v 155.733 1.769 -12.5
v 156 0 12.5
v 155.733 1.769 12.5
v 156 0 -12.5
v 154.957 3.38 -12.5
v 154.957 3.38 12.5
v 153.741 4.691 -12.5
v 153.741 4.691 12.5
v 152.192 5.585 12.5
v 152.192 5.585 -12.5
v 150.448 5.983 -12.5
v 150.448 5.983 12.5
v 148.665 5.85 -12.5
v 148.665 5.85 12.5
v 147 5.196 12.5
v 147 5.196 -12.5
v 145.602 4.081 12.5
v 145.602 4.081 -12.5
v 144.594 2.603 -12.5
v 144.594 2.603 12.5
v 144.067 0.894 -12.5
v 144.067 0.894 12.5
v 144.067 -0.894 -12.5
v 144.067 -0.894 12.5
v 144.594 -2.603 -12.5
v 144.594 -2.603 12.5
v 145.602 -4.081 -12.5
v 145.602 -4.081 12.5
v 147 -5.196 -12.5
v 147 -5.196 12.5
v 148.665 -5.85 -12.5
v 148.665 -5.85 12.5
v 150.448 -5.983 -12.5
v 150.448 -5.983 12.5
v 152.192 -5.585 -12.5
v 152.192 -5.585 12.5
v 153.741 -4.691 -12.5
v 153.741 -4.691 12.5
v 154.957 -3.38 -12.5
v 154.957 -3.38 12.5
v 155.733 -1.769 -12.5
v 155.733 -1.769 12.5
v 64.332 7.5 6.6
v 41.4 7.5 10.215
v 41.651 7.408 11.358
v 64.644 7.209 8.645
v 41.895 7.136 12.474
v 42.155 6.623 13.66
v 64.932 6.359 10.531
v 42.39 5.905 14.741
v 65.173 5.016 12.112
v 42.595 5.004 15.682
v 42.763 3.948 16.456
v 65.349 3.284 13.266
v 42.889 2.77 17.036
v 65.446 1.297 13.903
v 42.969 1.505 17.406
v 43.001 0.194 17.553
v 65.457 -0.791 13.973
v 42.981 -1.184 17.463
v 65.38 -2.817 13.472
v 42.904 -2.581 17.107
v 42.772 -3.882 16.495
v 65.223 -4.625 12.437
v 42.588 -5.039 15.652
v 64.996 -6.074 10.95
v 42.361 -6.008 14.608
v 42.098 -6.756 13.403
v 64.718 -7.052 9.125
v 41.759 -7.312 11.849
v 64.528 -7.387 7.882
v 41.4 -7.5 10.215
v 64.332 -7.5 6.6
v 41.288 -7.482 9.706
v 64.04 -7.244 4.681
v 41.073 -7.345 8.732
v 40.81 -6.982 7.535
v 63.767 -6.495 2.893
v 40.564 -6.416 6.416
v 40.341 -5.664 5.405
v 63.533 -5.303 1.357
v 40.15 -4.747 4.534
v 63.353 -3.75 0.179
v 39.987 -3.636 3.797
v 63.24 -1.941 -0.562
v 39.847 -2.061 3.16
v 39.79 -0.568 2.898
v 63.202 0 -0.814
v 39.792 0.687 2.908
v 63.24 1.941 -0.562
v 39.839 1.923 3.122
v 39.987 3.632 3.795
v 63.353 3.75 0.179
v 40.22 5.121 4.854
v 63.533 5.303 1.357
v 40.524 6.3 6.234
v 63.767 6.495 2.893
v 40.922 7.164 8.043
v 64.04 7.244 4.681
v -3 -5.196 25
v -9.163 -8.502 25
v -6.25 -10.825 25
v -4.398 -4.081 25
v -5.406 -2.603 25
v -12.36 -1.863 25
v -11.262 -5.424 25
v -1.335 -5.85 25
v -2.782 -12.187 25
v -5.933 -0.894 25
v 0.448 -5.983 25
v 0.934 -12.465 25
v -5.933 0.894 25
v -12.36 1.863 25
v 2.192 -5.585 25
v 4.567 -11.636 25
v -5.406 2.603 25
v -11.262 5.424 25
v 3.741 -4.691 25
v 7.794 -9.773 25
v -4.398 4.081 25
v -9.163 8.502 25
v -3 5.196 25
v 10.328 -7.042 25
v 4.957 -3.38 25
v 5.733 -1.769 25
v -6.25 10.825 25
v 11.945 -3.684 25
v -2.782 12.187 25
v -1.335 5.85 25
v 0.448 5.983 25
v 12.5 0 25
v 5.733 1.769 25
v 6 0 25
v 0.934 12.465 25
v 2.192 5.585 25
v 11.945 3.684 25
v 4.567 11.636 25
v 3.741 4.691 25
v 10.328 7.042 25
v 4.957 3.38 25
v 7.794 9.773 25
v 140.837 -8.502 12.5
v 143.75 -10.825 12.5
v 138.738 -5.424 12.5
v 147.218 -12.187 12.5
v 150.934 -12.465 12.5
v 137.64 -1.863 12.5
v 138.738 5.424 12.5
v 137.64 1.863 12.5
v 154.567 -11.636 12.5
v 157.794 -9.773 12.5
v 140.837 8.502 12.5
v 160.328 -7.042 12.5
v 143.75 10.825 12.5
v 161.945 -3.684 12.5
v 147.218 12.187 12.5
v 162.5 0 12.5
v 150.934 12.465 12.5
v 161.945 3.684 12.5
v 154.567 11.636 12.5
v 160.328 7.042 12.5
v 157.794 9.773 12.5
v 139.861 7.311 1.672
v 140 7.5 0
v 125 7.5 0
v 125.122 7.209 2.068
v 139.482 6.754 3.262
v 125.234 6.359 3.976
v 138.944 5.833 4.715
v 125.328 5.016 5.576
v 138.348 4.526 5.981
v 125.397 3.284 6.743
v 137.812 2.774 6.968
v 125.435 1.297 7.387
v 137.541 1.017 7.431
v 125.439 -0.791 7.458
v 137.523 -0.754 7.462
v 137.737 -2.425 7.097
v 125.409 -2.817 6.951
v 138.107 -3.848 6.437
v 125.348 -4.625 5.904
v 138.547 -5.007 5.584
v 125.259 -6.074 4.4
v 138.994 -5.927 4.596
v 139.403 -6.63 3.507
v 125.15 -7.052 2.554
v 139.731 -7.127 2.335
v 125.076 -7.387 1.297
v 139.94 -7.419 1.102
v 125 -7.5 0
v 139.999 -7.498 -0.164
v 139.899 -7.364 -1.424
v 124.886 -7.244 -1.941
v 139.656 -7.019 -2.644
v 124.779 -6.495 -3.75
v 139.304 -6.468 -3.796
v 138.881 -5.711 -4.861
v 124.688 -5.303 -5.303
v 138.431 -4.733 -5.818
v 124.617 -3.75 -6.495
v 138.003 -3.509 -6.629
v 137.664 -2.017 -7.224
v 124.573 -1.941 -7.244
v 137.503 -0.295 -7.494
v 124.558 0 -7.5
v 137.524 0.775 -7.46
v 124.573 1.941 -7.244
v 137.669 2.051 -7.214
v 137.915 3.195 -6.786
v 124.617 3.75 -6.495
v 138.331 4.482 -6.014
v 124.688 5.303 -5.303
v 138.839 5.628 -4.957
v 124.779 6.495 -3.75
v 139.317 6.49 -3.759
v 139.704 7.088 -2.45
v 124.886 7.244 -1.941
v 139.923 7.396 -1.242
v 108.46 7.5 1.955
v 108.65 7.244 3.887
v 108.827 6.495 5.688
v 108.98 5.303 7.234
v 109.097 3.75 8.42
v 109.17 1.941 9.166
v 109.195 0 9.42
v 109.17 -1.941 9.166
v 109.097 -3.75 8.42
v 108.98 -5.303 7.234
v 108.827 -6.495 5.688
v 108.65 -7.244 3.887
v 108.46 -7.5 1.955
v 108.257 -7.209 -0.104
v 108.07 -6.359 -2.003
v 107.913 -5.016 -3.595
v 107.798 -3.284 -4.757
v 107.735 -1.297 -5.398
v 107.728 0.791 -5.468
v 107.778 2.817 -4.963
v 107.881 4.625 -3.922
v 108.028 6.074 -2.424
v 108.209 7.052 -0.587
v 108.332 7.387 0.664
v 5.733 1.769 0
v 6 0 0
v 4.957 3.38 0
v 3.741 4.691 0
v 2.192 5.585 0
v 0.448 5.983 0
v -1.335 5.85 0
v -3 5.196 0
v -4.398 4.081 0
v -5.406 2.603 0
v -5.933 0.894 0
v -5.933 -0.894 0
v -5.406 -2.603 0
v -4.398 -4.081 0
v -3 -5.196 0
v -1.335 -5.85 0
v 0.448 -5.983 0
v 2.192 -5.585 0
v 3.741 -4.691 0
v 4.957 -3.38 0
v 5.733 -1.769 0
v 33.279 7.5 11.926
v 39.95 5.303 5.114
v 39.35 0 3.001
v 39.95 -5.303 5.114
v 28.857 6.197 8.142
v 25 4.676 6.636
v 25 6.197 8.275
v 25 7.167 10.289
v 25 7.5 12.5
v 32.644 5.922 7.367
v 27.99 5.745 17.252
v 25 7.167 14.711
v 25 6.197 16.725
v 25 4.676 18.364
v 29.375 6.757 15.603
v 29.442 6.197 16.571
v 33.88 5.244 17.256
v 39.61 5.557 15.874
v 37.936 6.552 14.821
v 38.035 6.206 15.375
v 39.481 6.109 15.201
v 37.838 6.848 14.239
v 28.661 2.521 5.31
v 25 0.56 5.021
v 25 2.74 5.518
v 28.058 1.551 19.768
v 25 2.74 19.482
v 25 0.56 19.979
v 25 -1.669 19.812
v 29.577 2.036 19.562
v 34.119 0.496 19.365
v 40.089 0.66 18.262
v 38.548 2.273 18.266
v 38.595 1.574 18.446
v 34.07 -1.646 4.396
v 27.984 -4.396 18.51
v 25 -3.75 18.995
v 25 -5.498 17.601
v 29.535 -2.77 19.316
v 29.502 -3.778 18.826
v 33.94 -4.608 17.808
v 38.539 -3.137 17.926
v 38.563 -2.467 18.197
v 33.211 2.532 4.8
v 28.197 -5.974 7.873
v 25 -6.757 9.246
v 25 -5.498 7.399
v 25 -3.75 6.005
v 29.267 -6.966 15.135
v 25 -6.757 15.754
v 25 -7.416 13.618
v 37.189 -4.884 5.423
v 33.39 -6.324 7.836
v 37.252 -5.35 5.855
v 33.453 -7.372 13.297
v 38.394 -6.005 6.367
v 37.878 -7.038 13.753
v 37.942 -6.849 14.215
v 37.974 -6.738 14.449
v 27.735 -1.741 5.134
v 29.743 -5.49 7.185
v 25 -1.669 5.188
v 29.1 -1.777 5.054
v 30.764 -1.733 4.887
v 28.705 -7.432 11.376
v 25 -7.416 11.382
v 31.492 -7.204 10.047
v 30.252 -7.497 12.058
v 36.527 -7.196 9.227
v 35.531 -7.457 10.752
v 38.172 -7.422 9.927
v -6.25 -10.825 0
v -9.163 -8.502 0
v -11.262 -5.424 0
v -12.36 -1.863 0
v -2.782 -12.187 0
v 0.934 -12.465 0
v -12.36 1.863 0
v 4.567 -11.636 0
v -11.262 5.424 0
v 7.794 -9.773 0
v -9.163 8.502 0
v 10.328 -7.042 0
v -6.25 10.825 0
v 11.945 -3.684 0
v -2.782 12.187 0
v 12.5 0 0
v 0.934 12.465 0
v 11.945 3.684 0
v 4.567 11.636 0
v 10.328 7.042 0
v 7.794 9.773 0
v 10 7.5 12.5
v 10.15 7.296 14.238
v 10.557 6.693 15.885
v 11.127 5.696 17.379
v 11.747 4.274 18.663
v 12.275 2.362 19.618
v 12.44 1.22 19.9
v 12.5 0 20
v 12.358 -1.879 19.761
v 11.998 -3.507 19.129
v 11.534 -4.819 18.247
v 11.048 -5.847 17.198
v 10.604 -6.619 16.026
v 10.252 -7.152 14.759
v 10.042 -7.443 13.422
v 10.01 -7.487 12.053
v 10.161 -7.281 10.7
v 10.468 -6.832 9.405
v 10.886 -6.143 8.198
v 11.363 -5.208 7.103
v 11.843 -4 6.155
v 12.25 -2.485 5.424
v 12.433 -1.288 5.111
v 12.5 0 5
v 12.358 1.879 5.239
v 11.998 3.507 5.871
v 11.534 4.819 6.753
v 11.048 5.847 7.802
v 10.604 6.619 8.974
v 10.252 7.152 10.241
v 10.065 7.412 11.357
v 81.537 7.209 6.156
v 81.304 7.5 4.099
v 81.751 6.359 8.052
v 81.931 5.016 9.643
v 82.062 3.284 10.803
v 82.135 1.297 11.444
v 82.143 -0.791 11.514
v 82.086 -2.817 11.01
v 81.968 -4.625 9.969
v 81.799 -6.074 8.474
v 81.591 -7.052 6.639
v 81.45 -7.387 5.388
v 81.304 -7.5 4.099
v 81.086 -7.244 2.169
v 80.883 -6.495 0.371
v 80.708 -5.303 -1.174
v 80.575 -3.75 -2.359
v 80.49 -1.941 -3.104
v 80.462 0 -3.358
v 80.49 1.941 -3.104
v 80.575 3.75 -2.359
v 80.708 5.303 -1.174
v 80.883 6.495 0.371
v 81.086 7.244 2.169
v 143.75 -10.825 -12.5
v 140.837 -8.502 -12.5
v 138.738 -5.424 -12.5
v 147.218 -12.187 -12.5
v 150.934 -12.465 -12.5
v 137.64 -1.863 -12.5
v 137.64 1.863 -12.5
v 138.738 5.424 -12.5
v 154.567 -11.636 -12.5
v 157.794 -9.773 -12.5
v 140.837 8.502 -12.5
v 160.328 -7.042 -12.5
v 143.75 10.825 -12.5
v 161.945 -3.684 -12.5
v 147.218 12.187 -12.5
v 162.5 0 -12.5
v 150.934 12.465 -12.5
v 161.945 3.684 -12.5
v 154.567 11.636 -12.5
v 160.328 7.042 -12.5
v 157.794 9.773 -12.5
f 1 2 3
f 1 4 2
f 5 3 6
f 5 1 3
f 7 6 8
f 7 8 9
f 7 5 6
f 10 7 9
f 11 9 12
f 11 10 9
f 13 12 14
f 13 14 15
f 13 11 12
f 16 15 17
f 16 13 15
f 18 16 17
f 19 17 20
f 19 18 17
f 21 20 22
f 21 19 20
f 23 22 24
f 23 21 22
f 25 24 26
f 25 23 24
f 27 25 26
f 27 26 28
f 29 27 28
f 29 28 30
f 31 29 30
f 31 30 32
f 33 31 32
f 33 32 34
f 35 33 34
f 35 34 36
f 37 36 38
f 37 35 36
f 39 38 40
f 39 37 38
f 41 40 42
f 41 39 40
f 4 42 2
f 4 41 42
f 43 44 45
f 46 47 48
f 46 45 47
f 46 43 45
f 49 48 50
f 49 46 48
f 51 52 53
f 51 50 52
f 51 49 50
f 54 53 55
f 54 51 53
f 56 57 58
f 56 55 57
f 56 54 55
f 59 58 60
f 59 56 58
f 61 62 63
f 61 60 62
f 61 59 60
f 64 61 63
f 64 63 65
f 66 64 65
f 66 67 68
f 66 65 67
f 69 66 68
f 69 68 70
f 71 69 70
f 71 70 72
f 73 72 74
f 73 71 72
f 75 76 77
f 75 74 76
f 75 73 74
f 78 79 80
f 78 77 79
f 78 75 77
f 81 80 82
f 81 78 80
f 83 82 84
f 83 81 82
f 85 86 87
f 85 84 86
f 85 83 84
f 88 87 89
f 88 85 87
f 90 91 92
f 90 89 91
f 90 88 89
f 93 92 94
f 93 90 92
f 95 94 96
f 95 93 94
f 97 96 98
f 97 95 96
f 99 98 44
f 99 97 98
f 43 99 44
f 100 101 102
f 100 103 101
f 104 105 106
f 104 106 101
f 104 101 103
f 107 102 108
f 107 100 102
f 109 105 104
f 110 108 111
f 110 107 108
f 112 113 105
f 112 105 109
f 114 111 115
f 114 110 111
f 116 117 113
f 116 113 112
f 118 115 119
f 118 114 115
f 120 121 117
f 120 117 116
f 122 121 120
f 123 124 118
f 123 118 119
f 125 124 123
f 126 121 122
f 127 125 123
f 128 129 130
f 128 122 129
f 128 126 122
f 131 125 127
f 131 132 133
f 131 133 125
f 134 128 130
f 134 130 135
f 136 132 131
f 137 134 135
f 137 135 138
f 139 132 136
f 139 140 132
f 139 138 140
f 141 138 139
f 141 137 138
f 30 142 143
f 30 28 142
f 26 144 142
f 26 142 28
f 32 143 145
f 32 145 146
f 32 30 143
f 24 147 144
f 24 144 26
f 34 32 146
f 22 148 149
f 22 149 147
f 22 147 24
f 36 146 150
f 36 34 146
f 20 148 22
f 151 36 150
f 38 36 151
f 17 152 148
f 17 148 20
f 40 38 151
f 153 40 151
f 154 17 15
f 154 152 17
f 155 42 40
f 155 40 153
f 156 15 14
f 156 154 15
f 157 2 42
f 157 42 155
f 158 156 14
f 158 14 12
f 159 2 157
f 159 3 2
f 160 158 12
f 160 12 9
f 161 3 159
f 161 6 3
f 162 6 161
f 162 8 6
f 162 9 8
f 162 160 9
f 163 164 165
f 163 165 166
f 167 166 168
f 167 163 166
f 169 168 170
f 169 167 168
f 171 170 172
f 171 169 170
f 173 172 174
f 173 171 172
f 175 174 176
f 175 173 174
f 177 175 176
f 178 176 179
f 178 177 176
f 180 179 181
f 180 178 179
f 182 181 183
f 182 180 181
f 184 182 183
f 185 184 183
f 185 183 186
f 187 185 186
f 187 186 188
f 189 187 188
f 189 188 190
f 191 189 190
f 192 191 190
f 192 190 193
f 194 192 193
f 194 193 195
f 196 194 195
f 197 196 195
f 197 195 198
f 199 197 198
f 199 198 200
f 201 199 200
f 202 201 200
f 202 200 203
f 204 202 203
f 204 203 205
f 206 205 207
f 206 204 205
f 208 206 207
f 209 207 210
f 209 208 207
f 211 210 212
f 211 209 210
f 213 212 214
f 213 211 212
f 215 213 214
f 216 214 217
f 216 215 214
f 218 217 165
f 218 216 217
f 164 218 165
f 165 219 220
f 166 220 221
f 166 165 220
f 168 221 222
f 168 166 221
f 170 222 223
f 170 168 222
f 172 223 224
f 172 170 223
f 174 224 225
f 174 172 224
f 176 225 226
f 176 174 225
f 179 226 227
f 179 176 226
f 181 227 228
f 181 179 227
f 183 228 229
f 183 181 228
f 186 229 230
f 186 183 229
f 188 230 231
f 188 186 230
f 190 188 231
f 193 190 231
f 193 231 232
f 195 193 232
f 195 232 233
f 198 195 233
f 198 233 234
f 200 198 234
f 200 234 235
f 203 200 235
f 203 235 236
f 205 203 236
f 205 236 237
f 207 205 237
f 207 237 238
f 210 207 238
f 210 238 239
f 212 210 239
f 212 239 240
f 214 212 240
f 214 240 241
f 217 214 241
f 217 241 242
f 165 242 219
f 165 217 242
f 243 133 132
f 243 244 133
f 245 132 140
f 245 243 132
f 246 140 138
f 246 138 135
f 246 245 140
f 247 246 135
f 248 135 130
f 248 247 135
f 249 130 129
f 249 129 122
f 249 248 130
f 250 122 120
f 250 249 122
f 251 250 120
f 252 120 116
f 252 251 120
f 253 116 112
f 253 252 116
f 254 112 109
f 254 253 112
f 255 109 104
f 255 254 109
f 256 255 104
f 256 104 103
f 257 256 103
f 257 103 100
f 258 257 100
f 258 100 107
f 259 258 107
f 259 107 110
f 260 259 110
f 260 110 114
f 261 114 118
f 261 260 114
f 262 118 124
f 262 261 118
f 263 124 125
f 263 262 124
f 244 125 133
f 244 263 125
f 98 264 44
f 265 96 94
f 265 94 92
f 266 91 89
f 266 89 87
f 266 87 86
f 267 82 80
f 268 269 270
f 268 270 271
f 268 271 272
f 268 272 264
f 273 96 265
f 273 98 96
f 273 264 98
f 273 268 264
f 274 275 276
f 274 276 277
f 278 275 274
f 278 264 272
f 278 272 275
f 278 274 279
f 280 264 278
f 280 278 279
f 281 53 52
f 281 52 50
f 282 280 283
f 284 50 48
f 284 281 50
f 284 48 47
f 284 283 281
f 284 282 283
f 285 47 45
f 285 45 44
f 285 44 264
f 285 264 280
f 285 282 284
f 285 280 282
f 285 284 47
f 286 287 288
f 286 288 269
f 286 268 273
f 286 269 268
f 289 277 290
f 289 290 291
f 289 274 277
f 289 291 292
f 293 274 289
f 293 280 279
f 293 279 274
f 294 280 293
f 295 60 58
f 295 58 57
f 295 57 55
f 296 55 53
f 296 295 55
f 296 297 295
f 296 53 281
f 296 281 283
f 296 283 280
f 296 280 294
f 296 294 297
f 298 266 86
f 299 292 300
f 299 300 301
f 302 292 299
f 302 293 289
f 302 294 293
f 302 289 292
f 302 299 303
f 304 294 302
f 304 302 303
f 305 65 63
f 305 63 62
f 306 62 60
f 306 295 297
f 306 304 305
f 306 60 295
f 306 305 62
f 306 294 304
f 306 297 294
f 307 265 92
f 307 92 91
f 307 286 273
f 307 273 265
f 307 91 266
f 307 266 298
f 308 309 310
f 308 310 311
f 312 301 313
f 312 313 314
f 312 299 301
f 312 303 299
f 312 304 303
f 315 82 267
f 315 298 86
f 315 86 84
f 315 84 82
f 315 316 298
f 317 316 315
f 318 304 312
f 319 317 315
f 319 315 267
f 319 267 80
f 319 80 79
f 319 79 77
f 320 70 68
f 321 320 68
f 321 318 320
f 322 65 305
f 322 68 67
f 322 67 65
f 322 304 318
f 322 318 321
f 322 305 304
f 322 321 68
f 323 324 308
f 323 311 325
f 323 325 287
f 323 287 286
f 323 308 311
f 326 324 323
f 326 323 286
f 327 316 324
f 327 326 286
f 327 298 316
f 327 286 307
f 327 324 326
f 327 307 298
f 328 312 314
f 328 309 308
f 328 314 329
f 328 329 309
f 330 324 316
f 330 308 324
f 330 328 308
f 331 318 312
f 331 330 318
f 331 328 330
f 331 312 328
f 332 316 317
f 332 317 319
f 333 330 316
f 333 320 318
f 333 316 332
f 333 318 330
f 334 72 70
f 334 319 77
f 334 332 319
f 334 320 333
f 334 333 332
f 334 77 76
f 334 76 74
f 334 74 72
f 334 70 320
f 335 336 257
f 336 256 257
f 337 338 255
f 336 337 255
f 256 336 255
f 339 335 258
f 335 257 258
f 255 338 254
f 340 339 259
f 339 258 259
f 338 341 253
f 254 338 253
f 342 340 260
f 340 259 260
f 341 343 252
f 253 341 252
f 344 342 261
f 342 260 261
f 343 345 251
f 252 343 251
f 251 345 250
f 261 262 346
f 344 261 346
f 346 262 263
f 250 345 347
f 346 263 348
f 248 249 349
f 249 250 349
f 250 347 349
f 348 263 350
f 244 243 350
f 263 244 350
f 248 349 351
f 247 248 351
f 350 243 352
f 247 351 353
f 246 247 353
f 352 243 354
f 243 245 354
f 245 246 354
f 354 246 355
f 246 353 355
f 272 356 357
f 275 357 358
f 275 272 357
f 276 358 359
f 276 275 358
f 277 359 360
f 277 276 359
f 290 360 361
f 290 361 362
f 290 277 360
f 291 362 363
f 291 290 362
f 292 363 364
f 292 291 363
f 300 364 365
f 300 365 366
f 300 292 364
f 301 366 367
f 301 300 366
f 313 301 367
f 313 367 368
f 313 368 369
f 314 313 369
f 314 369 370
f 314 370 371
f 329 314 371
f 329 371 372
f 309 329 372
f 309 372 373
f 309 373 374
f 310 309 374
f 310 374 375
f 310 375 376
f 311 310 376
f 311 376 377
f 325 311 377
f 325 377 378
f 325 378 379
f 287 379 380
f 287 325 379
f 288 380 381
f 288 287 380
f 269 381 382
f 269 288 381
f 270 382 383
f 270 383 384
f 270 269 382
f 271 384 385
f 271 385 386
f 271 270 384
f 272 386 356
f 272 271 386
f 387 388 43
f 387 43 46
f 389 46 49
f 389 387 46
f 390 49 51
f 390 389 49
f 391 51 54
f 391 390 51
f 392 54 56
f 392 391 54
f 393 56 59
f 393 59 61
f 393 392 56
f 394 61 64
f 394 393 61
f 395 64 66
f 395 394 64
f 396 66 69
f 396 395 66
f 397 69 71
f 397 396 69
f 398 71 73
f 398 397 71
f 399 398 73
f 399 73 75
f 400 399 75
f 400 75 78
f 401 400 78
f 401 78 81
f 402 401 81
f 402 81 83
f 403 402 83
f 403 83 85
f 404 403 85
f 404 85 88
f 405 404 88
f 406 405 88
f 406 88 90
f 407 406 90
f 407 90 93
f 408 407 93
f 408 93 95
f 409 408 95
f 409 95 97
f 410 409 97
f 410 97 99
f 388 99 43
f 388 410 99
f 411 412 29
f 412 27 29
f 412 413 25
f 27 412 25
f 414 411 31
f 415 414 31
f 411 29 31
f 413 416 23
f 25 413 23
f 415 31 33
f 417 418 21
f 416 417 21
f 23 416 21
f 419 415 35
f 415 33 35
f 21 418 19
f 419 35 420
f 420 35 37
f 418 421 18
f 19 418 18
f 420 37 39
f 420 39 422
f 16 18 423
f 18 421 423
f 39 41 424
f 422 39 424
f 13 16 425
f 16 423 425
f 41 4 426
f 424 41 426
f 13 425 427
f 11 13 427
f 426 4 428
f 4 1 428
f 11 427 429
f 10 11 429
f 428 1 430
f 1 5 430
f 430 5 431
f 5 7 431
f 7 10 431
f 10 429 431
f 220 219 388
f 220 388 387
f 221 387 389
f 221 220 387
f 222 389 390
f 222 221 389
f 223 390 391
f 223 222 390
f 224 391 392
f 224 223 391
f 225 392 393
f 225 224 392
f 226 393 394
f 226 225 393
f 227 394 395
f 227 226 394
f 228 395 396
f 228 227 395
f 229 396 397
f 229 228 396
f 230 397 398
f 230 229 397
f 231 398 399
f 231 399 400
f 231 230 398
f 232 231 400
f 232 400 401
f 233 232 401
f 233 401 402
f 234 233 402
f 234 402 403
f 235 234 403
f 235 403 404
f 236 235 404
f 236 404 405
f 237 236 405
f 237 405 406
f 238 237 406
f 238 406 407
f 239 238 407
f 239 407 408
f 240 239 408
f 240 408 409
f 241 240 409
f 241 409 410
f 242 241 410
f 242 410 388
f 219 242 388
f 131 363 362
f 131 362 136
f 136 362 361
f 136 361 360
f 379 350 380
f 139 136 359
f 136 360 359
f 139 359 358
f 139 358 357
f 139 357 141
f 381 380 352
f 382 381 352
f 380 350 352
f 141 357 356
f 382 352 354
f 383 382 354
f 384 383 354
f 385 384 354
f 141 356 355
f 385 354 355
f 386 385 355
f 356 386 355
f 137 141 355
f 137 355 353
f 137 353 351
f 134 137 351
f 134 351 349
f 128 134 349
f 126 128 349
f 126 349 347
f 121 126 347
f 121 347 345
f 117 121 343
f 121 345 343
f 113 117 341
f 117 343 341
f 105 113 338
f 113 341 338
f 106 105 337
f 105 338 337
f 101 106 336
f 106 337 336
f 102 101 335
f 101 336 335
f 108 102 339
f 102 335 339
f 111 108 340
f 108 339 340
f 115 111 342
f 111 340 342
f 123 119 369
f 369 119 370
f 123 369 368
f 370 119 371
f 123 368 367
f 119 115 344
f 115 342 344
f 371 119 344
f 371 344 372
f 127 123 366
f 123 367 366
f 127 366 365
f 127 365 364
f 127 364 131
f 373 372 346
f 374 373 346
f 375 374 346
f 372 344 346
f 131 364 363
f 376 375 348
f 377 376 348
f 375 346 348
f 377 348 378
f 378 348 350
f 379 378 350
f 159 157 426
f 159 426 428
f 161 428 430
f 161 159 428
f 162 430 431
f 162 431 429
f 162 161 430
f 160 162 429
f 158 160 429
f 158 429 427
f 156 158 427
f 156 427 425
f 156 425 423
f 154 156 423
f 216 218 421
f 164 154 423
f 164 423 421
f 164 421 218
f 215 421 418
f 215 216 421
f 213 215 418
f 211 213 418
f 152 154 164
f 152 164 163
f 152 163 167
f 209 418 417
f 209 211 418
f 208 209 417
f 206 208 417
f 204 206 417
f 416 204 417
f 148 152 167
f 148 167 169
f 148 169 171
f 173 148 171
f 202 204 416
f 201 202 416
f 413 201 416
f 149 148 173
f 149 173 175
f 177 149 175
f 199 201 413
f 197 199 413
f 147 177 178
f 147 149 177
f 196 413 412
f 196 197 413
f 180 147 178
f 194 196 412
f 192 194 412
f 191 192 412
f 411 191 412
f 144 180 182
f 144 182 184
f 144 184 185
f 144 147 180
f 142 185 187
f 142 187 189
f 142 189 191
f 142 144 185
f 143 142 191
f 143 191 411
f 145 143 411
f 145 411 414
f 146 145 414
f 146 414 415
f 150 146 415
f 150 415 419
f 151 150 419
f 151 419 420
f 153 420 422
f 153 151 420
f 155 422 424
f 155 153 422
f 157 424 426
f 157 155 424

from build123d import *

# Parameters (mm, degrees)
F0_R      = 12.5
F0_R_2    = 6
F1_DEPTH  = 25
F3_R      = 12.5
F3_R_2    = 6
F4_DEPTH  = 12.5
F5_R      = 7.5
F7_R      = 6
F8_DEPTH  = 25
F9_R      = 6
F10_DEPTH = 25


# Not quite as in the source:
# - a feature names something its author has since deleted; it is built from what else it names


with BuildPart() as f1:
    # F0 (on Top) → F1 (new body)
    with BuildSketch(Plane.XY):
        Circle(F0_R)
        Circle(F0_R_2, mode=Mode.SUBTRACT)
    extrude(amount=F1_DEPTH)



with BuildPart() as f4:
    # F3 (on Top) → F4 (new body, symmetric)
    with BuildSketch(Plane.XY):
        with Locations((150, 0)):
            Circle(F3_R)
        with Locations((150, 0)):
            Circle(F3_R_2, mode=Mode.SUBTRACT)
    extrude(amount=F4_DEPTH, both=True)


with BuildPart() as f1_1:
    add(f1.part)

    add(f4.part)  # F6 merges F4
    # F6: sweep along a path in F2
    with BuildLine(Plane.XZ) as f6_path:
        Line((0, 12.5), (25, 12.5))
        ThreePointArc((25, 12.5), (33.2790451747, 11.9260667636), (41.399703043, 10.2152470332))
        Line((41.399703043, 10.2152470332), (64.3324330449, 6.6001820378))
        Line((64.3324330449, 6.6001820378), (81.3044384122, 4.0990444832))
        Line((81.3044384122, 4.0990444832), (108.4596440196, 1.9552123267))
        Line((108.4596440196, 1.9552123267), (125, 0))
        Line((125, 0), (150, 0))
    # F5 (on Right) → F6 (sweep)
    with BuildSketch(Plane.YZ):
        with Locations((0, 12.5)):
            Circle(F5_R)
    sweep(path=f6_path.line, transition=Transition.RIGHT)

    # F7 (on Top) → F8 (cut)
    with BuildSketch(Plane.XY):
        Circle(F7_R)
    extrude(amount=F8_DEPTH, mode=Mode.SUBTRACT)

    # F9 (on face) → F10 (cut)
    with BuildSketch(Plane.XY.offset(12.5)):
        with Locations((150, 0)):
            Circle(F9_R)
    extrude(amount=-F10_DEPTH, mode=Mode.SUBTRACT)


solid = f1_1.part
